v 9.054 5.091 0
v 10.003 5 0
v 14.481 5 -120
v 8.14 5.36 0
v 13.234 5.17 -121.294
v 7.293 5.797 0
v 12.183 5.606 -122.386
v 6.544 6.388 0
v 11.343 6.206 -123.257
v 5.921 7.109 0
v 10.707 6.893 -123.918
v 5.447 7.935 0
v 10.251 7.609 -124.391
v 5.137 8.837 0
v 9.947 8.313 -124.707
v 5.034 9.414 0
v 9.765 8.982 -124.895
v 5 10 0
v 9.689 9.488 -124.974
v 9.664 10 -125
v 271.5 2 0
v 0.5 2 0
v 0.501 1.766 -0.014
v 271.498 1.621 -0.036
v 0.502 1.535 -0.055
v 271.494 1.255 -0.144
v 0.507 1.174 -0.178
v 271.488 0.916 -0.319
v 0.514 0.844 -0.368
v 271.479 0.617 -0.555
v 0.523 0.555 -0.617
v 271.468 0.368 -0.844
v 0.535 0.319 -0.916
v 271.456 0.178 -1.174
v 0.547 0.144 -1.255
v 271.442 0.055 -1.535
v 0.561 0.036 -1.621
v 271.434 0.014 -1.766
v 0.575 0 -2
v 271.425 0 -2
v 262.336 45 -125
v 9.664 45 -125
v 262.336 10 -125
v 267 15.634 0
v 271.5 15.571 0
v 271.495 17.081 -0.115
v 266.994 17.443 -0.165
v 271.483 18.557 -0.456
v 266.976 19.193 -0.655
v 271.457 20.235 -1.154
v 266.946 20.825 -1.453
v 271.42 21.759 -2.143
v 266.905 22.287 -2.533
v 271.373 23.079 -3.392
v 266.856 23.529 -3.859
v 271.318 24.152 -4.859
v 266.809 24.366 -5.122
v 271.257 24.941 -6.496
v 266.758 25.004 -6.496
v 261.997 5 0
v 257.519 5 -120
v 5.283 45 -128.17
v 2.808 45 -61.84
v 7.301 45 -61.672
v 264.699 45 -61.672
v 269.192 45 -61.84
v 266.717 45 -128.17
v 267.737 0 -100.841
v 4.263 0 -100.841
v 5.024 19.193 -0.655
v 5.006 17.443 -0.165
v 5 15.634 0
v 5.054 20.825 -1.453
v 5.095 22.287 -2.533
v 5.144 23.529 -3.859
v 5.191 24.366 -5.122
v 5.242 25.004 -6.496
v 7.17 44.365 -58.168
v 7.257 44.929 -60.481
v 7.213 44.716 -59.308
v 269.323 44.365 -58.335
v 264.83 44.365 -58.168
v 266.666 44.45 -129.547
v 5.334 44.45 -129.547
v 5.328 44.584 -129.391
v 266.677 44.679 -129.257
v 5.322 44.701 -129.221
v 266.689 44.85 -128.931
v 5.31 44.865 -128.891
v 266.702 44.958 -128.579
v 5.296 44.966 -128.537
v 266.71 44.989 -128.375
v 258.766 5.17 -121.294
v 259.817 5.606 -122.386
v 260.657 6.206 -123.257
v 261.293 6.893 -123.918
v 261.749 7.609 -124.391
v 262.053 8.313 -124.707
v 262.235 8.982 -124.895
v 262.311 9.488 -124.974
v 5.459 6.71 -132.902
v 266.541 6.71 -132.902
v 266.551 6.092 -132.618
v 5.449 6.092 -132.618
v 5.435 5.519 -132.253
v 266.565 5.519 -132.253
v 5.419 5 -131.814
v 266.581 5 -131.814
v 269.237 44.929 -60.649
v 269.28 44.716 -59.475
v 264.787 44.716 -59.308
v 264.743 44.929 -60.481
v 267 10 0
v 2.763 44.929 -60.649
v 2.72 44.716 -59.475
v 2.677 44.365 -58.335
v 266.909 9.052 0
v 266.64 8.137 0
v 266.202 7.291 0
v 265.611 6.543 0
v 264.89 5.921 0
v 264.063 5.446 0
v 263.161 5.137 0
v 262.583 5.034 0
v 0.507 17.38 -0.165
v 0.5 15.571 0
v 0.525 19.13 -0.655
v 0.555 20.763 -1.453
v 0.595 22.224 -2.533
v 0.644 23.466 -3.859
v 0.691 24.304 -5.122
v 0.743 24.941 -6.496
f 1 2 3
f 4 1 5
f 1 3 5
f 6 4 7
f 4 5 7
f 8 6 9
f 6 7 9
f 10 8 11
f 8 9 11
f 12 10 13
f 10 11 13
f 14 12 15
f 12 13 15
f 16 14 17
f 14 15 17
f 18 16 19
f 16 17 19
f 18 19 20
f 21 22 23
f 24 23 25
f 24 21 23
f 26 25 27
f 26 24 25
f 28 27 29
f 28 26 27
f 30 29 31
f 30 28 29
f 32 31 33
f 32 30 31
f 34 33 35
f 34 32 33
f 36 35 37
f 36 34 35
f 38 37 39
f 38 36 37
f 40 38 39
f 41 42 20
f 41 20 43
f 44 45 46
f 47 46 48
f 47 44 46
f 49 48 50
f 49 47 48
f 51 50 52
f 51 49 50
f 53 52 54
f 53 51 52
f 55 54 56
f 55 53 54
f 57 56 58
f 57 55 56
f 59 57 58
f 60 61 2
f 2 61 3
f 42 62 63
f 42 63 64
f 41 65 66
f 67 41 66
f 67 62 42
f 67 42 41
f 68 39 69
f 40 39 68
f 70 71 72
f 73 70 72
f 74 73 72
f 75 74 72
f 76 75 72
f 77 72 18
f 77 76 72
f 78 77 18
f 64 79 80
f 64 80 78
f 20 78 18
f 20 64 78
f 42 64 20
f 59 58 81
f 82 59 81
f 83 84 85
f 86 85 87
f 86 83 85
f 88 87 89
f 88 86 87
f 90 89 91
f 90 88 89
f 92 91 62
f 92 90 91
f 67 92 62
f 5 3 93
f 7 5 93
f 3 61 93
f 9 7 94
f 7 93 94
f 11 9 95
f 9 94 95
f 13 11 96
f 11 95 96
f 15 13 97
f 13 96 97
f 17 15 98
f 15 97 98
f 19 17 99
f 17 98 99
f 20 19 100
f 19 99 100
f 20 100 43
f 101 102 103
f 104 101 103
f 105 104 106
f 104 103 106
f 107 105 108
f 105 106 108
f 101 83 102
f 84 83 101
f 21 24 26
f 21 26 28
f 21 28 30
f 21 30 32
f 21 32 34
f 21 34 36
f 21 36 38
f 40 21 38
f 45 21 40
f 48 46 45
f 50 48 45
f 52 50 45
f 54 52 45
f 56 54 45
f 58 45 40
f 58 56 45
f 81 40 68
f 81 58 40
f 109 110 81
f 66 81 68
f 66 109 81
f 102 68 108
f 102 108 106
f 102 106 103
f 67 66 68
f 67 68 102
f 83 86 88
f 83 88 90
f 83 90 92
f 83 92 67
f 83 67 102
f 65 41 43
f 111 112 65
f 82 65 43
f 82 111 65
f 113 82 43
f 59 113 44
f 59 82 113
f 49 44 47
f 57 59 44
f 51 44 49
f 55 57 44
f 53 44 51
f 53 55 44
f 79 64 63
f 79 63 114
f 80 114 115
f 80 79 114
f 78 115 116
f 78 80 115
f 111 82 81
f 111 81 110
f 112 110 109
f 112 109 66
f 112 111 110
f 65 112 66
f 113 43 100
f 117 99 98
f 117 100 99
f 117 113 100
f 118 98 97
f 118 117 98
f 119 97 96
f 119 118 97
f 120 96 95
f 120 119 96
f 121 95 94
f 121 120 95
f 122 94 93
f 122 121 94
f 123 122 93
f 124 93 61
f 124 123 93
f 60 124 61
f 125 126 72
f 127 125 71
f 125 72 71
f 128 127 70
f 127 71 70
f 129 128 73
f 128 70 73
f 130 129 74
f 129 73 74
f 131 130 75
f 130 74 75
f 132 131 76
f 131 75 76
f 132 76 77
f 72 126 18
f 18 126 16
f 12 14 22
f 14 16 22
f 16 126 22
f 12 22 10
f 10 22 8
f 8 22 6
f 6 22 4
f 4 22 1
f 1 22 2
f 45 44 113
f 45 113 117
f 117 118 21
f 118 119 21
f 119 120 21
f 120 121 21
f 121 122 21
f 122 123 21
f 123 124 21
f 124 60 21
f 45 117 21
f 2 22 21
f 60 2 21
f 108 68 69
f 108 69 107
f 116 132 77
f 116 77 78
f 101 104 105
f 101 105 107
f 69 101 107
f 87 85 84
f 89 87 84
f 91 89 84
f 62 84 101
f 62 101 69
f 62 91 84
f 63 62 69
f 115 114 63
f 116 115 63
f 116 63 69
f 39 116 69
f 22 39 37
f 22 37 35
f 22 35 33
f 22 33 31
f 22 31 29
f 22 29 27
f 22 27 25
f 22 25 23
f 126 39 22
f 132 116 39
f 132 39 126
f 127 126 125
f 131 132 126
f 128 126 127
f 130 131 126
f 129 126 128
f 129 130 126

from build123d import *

# Parameters (mm, degrees)
SKETCH1_W           = 272
SKETCH1_H           = 134
BOSS_EXTRUDE2_DEPTH = 45
CUT_EXTRUDE8_DEPTH  = 300
CUT_EXTRUDE10_DEPTH = 300
CUT_EXTRUDE11_DEPTH = 40
CUT_EXTRUDE12_DEPTH = 5
CUT_EXTRUDE13_DEPTH = 5
FILLET1_R           = 10
FILLET2_R           = 5
FILLET3_R           = 10
FILLET5_R           = 2
FILLET6_R           = 2
FILLET7_R           = 2
BOSS_EXTRUDE3_DEPTH = 5
SKETCH18_W          = 22.005693375
SKETCH18_H          = 61.946637546
BOSS_EXTRUDE4_DEPTH = 5
SKETCH19_W          = 26.164660497
SKETCH19_H          = 10
BOSS_EXTRUDE5_DEPTH = 15
CUT_EXTRUDE15_DEPTH = 350
SKETCH22_W          = 22.005693375
SKETCH22_H          = 61.946637546
CUT_EXTRUDE16_DEPTH = 350
CUT_EXTRUDE17_DEPTH = 350
SKETCH26_W          = 366.999535542
SKETCH26_H          = 253.064882437
CUT_EXTRUDE18_DEPTH = 5
FILLET8_R           = 5
SKETCH27_W          = 167.245030015
SKETCH27_H          = 61.468608264
CUT_EXTRUDE19_DEPTH = 0.5
SKETCH28_W          = 245.78388014
SKETCH28_H          = 90.598055895
CUT_EXTRUDE20_DEPTH = 0.5
SKETCH29_W          = 367.28533999
SKETCH29_H          = 77.687990399
CUT_EXTRUDE21_DEPTH = 0.5


with BuildPart() as part:
    # Sketch1 → Boss-Extrude2 (new body)
    with BuildSketch(Plane(origin=(0, 0, 0), x_dir=(1, 0, 0), z_dir=(0, 1, 0))):
        with Locations((136, 67)):
            Rectangle(SKETCH1_W, SKETCH1_H)
    extrude(amount=BOSS_EXTRUDE2_DEPTH)

    # Sketch8 → Cut-Extrude8 (cut)
    with BuildSketch(Plane.ZY):
        Polygon((-134, 45), (-130, 45), (-134, 0), align=None)
    extrude(amount=-CUT_EXTRUDE8_DEPTH, mode=Mode.SUBTRACT)

    # Sketch9 → Cut-Extrude10 (cut)
    with BuildSketch(Plane.XZ):
        Polygon((0, -134), (5, -134), (0, 0), align=None)
        Polygon((272, -134), (267, -134), (272, 0), align=None)
    extrude(amount=-CUT_EXTRUDE10_DEPTH, mode=Mode.SUBTRACT)

    # Sketch11 → Cut-Extrude11 (cut)
    with BuildSketch(Plane(origin=(0, 45, 0), x_dir=(1, 0, 0), z_dir=(0, 1, 0))):
        Polygon((9.664179104, 125), (262.335820896, 125), (267, 0), (5, 0), align=None)
    extrude(amount=-CUT_EXTRUDE11_DEPTH, mode=Mode.SUBTRACT)

    # Sketch12 → Cut-Extrude12 (cut)
    with BuildSketch(Plane(origin=(0, 0, 0), x_dir=(-0.037287484326558824, 0, 0.9993045799517766), z_dir=(-0.9993045799517766, 0, -0.037287484326558824))):
        Polygon((0, 22.5), (-60.090467519, 45), (0, 45), align=None)
    extrude(amount=-CUT_EXTRUDE12_DEPTH, mode=Mode.SUBTRACT)

    # Sketch13 → Cut-Extrude13 (cut)
    with BuildSketch(Plane(origin=(271.621823035, 0, -10.135142651), x_dir=(-0.03728748432655886, 0, -0.9993045799517766), z_dir=(0.9993045799517766, 0, -0.03728748432655886))):
        Polygon((-10.142195737, 22.5), (49.948271782, 45), (-10.142195737, 45), align=None)
    extrude(amount=-CUT_EXTRUDE13_DEPTH, mode=Mode.SUBTRACT)

    # Fillet1
    fillet1_edges = [part.edges().sort_by_distance(p)[0] for p in [
        (2.5, 22.534904388, 0),
        (269.5, 22.534904388, 0),
    ]]
    fillet(fillet1_edges, radius=FILLET1_R)

    # Fillet2
    fillet2_edges = [part.edges().sort_by_distance(p)[0] for p in [
        (7.332089552, 5, -62.5),
        (136, 5, -125),
        (264.667910448, 5, -62.5),
    ]]
    fillet(fillet2_edges, radius=FILLET2_R)

    # Fillet3
    fillet3_edges = [part.edges().sort_by_distance(p)[0] for p in [
        (4.737146475, 45, -59.955525519),
        (267.262853525, 45, -59.955525519),
    ]]
    fillet(fillet3_edges, radius=FILLET3_R)

    # Fillet5
    fillet5_edges = [part.edges().sort_by_distance(p)[0] for p in [
        (136, 0, 0),
    ]]
    fillet(fillet5_edges, radius=FILLET5_R)

    # Fillet6
    fillet6_edges = [part.edges().sort_by_distance(p)[0] for p in [
        (136, 0, -134),
    ]]
    fillet(fillet6_edges, radius=FILLET6_R)

    # Fillet7
    fillet7_edges = [part.edges().sort_by_distance(p)[0] for p in [
        (136, 45, -130),
    ]]
    fillet(fillet7_edges, radius=FILLET7_R)

    # Sketch17 → Boss-Extrude3 (add)
    with BuildSketch(Plane.XZ):
        Polygon((0, 0), (242.409497269, 0), (294.229063893, 0), (294.229063893, -131.814336534), (242.409497269, -131.814336534), (0, -131.814336534), align=None)
    extrude(amount=BOSS_EXTRUDE3_DEPTH)

    # Sketch18 → Boss-Extrude4 (add)
    with BuildSketch(Plane(origin=(0, 0, 0), x_dir=(1, 0, 0), z_dir=(0, 1, 0))):
        with Locations((283.226217206, 100.841017761)):
            Rectangle(SKETCH18_W, SKETCH18_H)
    extrude(amount=BOSS_EXTRUDE4_DEPTH)

    # Sketch19 → Boss-Extrude5 (add)
    with BuildSketch(Plane(origin=(0, 0, -131.814336534), x_dir=(-1, 0, 0), z_dir=(0, 0, -1))):
        with Locations((-281.146733645, 0)):
            Rectangle(SKETCH19_W, SKETCH19_H)
    extrude(amount=BOSS_EXTRUDE5_DEPTH)

    # Sketch21 → Cut-Extrude15 (cut)
    with BuildSketch(Plane(origin=(294.229063893, 0, 0), x_dir=(0, 0, -1), z_dir=(1, 0, 0))):
        Polygon((69.867698988, -5), (131.814336534, 5), (146.814336534, 5), (146.814336534, -5), align=None)
    extrude(amount=-CUT_EXTRUDE15_DEPTH, mode=Mode.SUBTRACT)

    # Sketch22 → Cut-Extrude16 (cut)
    with BuildSketch(Plane(origin=(0, 5, 0), x_dir=(1, 0, 0), z_dir=(0, 1, 0))):
        with Locations((283.226217206, 100.841017761)):
            Rectangle(SKETCH22_W, SKETCH22_H)
    extrude(amount=-CUT_EXTRUDE16_DEPTH, mode=Mode.SUBTRACT)

    # Sketch24 → Cut-Extrude17 (cut)
    with BuildSketch(Plane(origin=(0, 0, 0), x_dir=(1, 0, 0), z_dir=(0, 1, 0))):
        Polygon((294.229063893, 69.867698988), (272.223370518, 69.867698988), (272.223370518, 100.841017761), (268.237275457, 100.841017761), (271.925373134, 2), (271.925373134, 0), (294.229063893, 0), align=None)
    extrude(amount=-CUT_EXTRUDE17_DEPTH, mode=Mode.SUBTRACT)

    # Sketch26 → Cut-Extrude18 (cut)
    with BuildSketch(Plane.XZ.offset(5)):
        with Locations((88.425605363, -126.532441219)):
            Rectangle(SKETCH26_W, SKETCH26_H)
    extrude(amount=-CUT_EXTRUDE18_DEPTH, mode=Mode.SUBTRACT)

    # Fillet8
    # the kernel refuses this fillet: 5 mm, written as the material it takes off along each edge
    with BuildSketch(Plane(origin=(276.867640222, 5, -133.555555556), x_dir=(0, 0.996072640692687, 0.08853979028378928), z_dir=(-1, 0, 0))) as fillet8_piece_1:
        with BuildLine():
            CenterArc((3.94042259, -5), FILLET8_R, 90, 49.222455221)
            Line((0.154167167, -1.734380629), (0.078442059, -1.669068242))
            ThreePointArc((0.078442059, -1.669068242), (-0.022523681, -0.876044294), (-0.099607264, -0.008853979))
            Line((-0.099607264, -0.008853979), (0, 0.1))
            Line((0, 0.1), (3.94042259, 0.1))
            Line((3.94042259, 0.1), (3.94042259, 0))
        make_face()
    extrude(amount=281.735280444, mode=Mode.SUBTRACT)

    # Sketch27 → Cut-Extrude19 (cut)
    with BuildSketch(Plane(origin=(271.621823035, 0, -10.135142651), x_dir=(-0.03728748432655886, 0, -0.9993045799517766), z_dir=(0.9993045799517766, 0, -0.03728748432655886))):
        with Locations((55.876182623, 22.646622557)):
            Rectangle(SKETCH27_W, SKETCH27_H)
    extrude(amount=-CUT_EXTRUDE19_DEPTH, mode=Mode.SUBTRACT)

    # Sketch28 → Cut-Extrude20 (cut)
    with BuildSketch(Plane(origin=(0, 0, 0), x_dir=(-0.037287484326558824, 0, 0.9993045799517766), z_dir=(-0.9993045799517766, 0, -0.037287484326558824))):
        with Locations((-84.953882452, 20.133440951)):
            Rectangle(SKETCH28_W, SKETCH28_H)
    extrude(amount=-CUT_EXTRUDE20_DEPTH, mode=Mode.SUBTRACT)

    # Sketch29 → Cut-Extrude21 (cut)
    with BuildSketch(Plane(origin=(0, 11.817736404, -132.949534542), x_dir=(-1, 0, 0), z_dir=(0, 0.08853979028379444, -0.9960726406926865))):
        with Locations((-152.32774441, 16.969098034)):
            Rectangle(SKETCH29_W, SKETCH29_H)
    extrude(amount=-CUT_EXTRUDE21_DEPTH, mode=Mode.SUBTRACT)


solid = part.part
